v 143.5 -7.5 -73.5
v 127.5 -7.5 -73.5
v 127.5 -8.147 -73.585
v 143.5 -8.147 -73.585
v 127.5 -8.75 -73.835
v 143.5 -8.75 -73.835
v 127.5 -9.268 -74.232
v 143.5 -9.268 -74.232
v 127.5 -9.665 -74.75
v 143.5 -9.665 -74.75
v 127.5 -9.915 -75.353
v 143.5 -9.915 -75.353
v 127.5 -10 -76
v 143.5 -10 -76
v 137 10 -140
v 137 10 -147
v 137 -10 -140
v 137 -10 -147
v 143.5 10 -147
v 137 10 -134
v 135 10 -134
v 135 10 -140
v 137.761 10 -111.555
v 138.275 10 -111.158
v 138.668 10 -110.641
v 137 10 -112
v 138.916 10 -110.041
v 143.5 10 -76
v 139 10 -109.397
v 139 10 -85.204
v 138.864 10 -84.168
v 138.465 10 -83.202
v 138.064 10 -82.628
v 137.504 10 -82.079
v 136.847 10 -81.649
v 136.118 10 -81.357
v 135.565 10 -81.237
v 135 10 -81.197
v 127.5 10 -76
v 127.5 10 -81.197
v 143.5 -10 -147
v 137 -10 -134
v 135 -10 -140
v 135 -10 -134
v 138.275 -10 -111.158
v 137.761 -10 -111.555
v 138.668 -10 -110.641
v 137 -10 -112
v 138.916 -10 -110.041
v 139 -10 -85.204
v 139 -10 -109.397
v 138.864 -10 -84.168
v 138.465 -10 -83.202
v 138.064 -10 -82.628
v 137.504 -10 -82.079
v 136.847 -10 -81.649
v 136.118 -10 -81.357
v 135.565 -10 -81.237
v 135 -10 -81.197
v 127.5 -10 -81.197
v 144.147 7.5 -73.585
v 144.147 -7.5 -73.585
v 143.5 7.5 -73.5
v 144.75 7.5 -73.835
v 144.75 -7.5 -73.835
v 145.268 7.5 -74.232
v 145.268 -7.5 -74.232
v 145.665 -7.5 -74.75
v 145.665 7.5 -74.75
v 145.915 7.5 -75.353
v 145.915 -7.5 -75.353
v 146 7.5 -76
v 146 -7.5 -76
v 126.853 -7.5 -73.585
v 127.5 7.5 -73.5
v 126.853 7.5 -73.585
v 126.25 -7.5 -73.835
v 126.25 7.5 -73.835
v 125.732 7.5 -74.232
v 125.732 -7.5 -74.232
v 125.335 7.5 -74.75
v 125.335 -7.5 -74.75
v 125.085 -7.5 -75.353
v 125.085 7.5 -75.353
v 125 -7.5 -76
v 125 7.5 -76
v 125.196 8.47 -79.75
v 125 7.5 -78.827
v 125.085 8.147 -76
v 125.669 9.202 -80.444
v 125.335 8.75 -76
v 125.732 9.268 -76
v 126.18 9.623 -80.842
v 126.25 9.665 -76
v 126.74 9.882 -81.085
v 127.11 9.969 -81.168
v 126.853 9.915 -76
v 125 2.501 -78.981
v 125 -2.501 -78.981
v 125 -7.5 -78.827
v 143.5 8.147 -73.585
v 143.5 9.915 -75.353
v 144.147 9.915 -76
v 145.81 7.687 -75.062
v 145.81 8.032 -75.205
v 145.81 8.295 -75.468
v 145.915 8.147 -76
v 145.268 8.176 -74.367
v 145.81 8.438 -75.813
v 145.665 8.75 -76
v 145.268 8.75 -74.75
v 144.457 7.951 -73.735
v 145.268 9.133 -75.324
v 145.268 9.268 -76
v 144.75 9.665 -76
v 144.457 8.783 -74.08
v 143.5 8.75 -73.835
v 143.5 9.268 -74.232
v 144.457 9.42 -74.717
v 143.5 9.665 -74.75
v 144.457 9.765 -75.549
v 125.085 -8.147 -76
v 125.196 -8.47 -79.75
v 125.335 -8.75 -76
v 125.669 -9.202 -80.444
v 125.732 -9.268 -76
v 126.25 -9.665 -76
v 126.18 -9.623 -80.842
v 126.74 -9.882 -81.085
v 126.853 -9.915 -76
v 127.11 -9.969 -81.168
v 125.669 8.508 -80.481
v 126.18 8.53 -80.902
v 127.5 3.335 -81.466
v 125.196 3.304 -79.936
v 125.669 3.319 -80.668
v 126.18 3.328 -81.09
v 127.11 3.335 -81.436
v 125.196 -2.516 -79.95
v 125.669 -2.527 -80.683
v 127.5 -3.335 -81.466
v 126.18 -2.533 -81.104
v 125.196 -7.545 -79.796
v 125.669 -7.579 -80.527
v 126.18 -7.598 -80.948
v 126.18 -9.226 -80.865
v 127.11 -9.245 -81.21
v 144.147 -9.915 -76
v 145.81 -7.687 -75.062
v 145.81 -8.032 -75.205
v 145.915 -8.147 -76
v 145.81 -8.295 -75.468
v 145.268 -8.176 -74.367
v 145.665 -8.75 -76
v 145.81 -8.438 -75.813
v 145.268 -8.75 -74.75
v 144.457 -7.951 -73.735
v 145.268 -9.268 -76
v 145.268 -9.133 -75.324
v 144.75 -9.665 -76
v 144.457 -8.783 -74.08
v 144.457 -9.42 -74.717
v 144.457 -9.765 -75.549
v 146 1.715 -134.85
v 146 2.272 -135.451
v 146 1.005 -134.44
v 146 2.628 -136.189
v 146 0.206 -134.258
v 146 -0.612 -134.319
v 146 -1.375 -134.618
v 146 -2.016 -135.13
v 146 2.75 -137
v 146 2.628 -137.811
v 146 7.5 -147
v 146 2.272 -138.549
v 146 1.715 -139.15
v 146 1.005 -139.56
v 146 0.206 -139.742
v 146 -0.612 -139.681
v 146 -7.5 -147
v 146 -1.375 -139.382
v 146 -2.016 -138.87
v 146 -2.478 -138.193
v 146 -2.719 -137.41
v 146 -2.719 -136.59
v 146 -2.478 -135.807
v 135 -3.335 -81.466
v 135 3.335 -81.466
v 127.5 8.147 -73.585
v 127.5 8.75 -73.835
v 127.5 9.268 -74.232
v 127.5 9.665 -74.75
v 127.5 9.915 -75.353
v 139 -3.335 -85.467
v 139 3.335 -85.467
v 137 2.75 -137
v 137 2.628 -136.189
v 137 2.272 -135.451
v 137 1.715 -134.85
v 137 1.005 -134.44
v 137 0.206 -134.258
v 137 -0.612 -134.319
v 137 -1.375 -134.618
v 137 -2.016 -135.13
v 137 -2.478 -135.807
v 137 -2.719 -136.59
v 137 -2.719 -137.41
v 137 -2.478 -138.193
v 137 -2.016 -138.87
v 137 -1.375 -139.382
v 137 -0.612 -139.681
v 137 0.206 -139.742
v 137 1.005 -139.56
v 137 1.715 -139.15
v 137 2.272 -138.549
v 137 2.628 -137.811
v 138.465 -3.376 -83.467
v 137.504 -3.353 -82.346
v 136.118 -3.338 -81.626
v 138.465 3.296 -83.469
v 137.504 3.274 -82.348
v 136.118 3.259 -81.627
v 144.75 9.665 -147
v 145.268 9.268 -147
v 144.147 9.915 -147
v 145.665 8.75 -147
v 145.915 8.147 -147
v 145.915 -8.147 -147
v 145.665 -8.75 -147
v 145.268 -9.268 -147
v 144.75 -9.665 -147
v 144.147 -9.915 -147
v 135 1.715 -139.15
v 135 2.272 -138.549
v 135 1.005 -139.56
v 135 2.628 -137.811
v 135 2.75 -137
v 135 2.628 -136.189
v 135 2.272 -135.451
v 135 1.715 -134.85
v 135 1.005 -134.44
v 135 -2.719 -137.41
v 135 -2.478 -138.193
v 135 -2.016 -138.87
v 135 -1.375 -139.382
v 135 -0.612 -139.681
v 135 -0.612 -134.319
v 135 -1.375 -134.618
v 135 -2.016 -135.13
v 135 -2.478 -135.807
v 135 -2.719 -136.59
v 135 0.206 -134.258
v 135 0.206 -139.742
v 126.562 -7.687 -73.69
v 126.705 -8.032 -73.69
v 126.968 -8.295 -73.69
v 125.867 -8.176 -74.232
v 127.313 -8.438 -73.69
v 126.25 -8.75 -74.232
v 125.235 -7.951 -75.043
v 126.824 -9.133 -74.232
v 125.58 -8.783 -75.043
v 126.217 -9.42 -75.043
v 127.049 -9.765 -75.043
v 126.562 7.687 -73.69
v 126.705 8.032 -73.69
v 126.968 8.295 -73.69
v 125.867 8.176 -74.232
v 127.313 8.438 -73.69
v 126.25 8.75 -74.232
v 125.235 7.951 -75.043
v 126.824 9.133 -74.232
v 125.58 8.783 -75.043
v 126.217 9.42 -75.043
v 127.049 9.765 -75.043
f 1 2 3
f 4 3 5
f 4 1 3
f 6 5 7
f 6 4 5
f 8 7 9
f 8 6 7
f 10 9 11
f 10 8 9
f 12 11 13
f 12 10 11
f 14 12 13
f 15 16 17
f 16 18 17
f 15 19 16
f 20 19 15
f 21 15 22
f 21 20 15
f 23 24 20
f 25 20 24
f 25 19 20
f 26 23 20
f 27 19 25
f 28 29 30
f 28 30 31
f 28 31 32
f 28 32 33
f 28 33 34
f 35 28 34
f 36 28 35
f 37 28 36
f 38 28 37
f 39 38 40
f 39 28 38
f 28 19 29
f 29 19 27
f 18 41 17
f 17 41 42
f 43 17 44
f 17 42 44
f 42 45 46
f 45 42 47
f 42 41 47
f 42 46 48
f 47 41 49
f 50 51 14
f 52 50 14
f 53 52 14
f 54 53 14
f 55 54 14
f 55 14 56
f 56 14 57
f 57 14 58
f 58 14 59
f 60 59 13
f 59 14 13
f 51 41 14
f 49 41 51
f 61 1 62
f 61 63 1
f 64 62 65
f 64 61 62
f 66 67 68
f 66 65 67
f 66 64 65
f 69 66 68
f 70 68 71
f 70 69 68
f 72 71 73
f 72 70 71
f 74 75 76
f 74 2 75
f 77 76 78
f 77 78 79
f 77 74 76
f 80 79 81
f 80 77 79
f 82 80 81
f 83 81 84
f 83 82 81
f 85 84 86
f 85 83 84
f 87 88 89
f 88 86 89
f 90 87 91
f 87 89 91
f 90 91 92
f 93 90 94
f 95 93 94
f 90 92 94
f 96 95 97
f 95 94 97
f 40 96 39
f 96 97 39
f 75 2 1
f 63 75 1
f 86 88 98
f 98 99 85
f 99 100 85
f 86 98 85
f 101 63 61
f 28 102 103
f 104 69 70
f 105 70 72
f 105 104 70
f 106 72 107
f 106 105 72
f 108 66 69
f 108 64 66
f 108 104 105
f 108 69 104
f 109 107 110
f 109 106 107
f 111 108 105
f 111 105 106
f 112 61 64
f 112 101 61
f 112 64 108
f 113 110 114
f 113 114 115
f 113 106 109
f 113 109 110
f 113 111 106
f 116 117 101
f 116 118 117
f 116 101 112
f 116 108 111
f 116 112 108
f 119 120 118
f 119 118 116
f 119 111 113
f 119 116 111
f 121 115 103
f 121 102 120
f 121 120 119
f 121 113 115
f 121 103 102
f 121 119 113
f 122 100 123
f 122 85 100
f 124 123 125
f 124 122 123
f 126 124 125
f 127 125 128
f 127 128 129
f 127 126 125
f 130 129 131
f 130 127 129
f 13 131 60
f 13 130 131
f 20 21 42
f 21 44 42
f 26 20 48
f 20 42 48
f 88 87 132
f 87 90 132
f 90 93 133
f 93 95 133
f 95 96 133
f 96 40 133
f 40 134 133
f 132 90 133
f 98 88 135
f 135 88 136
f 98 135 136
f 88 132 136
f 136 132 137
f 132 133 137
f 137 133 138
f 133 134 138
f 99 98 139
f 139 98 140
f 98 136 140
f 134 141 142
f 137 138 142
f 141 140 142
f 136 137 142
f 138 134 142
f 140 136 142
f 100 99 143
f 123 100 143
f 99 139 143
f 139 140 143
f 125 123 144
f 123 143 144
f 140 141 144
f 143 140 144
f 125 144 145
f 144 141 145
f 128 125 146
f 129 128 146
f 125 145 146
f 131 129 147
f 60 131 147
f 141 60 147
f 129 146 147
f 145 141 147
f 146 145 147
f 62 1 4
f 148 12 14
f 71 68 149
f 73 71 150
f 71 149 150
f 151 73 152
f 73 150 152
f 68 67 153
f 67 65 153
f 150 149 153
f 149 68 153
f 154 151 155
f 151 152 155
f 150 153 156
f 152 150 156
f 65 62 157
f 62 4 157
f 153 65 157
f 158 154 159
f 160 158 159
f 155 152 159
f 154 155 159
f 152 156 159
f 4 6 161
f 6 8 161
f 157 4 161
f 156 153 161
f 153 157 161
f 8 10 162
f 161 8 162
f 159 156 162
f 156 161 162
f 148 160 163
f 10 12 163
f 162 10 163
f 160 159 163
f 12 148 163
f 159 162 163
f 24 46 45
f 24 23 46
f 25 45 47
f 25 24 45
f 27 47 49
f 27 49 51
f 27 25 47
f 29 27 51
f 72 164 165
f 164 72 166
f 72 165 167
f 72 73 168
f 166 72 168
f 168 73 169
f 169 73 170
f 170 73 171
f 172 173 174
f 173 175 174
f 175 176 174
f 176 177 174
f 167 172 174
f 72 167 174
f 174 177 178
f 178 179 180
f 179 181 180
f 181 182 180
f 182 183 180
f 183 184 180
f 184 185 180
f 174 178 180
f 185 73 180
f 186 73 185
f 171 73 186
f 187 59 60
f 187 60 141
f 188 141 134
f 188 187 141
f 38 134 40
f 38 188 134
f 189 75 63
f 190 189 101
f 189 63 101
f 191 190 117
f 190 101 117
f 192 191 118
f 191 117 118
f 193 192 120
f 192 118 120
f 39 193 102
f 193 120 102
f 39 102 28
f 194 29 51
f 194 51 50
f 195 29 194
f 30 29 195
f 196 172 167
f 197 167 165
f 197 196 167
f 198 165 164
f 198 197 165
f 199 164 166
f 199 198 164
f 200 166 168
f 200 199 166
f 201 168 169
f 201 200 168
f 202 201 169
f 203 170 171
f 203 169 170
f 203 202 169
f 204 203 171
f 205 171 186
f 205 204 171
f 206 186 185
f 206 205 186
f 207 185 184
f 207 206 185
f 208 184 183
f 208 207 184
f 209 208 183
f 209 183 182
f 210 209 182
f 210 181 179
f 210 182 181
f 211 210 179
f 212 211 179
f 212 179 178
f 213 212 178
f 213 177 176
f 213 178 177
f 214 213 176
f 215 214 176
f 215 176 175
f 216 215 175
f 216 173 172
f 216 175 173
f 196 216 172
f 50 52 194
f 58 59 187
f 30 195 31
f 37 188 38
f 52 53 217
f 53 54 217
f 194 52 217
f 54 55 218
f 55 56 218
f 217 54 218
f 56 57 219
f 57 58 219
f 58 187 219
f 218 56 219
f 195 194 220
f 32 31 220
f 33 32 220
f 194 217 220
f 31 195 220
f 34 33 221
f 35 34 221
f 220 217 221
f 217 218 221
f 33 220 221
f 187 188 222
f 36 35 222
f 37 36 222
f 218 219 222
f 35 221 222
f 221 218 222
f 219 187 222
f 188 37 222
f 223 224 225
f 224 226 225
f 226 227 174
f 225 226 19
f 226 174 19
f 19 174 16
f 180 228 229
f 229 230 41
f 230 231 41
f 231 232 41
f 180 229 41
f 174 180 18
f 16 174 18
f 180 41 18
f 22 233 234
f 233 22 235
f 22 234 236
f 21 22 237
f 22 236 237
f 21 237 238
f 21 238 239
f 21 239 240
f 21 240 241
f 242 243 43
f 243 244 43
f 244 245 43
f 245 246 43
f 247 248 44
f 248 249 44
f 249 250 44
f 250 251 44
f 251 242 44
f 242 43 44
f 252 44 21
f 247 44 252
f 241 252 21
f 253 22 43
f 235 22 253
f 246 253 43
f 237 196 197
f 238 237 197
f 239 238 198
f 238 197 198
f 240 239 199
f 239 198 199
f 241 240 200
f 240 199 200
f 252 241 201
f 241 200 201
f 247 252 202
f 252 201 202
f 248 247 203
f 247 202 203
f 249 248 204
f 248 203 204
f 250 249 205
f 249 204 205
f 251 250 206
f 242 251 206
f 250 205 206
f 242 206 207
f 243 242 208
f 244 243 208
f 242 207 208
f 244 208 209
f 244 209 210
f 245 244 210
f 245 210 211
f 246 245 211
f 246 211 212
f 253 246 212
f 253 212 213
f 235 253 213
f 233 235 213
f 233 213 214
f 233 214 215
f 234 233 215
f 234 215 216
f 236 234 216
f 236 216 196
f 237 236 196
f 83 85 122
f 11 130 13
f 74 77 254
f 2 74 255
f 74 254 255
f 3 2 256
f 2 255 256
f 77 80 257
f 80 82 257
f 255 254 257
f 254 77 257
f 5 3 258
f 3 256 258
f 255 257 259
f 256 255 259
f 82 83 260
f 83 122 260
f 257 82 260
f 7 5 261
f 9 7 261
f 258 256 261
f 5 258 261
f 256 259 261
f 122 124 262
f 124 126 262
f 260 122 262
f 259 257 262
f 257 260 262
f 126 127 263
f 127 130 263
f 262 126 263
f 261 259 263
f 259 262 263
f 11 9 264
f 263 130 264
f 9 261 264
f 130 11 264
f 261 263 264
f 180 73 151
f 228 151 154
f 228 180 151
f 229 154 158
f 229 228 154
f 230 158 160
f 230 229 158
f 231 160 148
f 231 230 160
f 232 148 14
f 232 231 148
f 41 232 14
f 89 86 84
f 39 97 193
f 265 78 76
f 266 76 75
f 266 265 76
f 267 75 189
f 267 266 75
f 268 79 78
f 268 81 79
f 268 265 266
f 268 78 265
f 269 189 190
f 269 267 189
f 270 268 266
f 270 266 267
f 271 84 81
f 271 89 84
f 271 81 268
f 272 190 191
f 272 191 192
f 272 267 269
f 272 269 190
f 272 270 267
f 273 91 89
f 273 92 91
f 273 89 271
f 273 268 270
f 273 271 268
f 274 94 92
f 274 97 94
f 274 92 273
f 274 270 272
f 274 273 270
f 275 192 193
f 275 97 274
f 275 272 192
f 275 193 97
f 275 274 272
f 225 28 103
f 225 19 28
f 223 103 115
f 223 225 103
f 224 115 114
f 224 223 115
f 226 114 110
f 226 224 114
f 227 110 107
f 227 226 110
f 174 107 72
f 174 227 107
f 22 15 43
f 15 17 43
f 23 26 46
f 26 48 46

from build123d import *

# Parameters (mm, degrees)
PAD063_DEPTH         = 10
SKETCH257_R          = 2.75
POCKET173_DEPTH      = 12.001
POCKET173_DEPTH_BACK = 9.001
FILLET011_R          = 2.5


with BuildPart() as part:
    # Sketch256 → Pad063 (new body, symmetric)
    with BuildSketch(Plane.XZ):
        Polygon((-12, 8.5), (9, 8.5), (9, -65), (0, -65), (0, -58), (-2, -58), (-2, -52), (0, -52), (0, -30), (2, -28.831445), (2, -3.5), (-2, 0.5), (-12, 0.5), align=None)
    extrude(amount=PAD063_DEPTH, both=True)

    # Sketch258 → Groove007 (revolve, cut)
    with BuildSketch(Plane.XZ):
        with BuildLine():
            Line((-12, 0.5), (-12, -8.5))
            Line((-12, -8.5), (2, -8.5))
            Line((2, -3.5), (2, -8.5))
            ThreePointArc((2, -3.5), (0.828427, -0.671573), (-2, 0.5))
            Line((-12, 0.5), (-2, 0.5))
        make_face()
    revolve(axis=Axis((0, 0, 165.5), (1, 0, 0)), mode=Mode.SUBTRACT)

    # Sketch257 → Pocket173 (cut, two sides)
    with BuildSketch(Plane.YZ) as pocket173_sk:
        with Locations((0, -55)):
            Circle(SKETCH257_R)
    extrude(amount=-POCKET173_DEPTH, mode=Mode.SUBTRACT)
    extrude(pocket173_sk.sketch, amount=POCKET173_DEPTH_BACK, mode=Mode.SUBTRACT)

    # Fillet011
    fillet011_edges = [part.edges().sort_by_distance(p)[0] for p in [
        (-12, -5.002299, 0.575845),
        (-12, 5.002299, 0.575845),
        (-12, 10, 4.651655),
        (-12, -10, 4.651655),
        (-12, 0, 8.5),
        (-1.5, -10, 8.5),
        (-1.5, 10, 8.5),
        (9, 0, 8.5),
        (9, 10, -28.25),
        (9, -10, -28.25),
        (2, 0, -28.831445),
    ]]
    fillet(fillet011_edges, radius=FILLET011_R)


with BuildPart() as part_1:
    # Body022056 placement: moved
    add(part.part.moved(Location((137, 0, -82))))


solid = part_1.part
